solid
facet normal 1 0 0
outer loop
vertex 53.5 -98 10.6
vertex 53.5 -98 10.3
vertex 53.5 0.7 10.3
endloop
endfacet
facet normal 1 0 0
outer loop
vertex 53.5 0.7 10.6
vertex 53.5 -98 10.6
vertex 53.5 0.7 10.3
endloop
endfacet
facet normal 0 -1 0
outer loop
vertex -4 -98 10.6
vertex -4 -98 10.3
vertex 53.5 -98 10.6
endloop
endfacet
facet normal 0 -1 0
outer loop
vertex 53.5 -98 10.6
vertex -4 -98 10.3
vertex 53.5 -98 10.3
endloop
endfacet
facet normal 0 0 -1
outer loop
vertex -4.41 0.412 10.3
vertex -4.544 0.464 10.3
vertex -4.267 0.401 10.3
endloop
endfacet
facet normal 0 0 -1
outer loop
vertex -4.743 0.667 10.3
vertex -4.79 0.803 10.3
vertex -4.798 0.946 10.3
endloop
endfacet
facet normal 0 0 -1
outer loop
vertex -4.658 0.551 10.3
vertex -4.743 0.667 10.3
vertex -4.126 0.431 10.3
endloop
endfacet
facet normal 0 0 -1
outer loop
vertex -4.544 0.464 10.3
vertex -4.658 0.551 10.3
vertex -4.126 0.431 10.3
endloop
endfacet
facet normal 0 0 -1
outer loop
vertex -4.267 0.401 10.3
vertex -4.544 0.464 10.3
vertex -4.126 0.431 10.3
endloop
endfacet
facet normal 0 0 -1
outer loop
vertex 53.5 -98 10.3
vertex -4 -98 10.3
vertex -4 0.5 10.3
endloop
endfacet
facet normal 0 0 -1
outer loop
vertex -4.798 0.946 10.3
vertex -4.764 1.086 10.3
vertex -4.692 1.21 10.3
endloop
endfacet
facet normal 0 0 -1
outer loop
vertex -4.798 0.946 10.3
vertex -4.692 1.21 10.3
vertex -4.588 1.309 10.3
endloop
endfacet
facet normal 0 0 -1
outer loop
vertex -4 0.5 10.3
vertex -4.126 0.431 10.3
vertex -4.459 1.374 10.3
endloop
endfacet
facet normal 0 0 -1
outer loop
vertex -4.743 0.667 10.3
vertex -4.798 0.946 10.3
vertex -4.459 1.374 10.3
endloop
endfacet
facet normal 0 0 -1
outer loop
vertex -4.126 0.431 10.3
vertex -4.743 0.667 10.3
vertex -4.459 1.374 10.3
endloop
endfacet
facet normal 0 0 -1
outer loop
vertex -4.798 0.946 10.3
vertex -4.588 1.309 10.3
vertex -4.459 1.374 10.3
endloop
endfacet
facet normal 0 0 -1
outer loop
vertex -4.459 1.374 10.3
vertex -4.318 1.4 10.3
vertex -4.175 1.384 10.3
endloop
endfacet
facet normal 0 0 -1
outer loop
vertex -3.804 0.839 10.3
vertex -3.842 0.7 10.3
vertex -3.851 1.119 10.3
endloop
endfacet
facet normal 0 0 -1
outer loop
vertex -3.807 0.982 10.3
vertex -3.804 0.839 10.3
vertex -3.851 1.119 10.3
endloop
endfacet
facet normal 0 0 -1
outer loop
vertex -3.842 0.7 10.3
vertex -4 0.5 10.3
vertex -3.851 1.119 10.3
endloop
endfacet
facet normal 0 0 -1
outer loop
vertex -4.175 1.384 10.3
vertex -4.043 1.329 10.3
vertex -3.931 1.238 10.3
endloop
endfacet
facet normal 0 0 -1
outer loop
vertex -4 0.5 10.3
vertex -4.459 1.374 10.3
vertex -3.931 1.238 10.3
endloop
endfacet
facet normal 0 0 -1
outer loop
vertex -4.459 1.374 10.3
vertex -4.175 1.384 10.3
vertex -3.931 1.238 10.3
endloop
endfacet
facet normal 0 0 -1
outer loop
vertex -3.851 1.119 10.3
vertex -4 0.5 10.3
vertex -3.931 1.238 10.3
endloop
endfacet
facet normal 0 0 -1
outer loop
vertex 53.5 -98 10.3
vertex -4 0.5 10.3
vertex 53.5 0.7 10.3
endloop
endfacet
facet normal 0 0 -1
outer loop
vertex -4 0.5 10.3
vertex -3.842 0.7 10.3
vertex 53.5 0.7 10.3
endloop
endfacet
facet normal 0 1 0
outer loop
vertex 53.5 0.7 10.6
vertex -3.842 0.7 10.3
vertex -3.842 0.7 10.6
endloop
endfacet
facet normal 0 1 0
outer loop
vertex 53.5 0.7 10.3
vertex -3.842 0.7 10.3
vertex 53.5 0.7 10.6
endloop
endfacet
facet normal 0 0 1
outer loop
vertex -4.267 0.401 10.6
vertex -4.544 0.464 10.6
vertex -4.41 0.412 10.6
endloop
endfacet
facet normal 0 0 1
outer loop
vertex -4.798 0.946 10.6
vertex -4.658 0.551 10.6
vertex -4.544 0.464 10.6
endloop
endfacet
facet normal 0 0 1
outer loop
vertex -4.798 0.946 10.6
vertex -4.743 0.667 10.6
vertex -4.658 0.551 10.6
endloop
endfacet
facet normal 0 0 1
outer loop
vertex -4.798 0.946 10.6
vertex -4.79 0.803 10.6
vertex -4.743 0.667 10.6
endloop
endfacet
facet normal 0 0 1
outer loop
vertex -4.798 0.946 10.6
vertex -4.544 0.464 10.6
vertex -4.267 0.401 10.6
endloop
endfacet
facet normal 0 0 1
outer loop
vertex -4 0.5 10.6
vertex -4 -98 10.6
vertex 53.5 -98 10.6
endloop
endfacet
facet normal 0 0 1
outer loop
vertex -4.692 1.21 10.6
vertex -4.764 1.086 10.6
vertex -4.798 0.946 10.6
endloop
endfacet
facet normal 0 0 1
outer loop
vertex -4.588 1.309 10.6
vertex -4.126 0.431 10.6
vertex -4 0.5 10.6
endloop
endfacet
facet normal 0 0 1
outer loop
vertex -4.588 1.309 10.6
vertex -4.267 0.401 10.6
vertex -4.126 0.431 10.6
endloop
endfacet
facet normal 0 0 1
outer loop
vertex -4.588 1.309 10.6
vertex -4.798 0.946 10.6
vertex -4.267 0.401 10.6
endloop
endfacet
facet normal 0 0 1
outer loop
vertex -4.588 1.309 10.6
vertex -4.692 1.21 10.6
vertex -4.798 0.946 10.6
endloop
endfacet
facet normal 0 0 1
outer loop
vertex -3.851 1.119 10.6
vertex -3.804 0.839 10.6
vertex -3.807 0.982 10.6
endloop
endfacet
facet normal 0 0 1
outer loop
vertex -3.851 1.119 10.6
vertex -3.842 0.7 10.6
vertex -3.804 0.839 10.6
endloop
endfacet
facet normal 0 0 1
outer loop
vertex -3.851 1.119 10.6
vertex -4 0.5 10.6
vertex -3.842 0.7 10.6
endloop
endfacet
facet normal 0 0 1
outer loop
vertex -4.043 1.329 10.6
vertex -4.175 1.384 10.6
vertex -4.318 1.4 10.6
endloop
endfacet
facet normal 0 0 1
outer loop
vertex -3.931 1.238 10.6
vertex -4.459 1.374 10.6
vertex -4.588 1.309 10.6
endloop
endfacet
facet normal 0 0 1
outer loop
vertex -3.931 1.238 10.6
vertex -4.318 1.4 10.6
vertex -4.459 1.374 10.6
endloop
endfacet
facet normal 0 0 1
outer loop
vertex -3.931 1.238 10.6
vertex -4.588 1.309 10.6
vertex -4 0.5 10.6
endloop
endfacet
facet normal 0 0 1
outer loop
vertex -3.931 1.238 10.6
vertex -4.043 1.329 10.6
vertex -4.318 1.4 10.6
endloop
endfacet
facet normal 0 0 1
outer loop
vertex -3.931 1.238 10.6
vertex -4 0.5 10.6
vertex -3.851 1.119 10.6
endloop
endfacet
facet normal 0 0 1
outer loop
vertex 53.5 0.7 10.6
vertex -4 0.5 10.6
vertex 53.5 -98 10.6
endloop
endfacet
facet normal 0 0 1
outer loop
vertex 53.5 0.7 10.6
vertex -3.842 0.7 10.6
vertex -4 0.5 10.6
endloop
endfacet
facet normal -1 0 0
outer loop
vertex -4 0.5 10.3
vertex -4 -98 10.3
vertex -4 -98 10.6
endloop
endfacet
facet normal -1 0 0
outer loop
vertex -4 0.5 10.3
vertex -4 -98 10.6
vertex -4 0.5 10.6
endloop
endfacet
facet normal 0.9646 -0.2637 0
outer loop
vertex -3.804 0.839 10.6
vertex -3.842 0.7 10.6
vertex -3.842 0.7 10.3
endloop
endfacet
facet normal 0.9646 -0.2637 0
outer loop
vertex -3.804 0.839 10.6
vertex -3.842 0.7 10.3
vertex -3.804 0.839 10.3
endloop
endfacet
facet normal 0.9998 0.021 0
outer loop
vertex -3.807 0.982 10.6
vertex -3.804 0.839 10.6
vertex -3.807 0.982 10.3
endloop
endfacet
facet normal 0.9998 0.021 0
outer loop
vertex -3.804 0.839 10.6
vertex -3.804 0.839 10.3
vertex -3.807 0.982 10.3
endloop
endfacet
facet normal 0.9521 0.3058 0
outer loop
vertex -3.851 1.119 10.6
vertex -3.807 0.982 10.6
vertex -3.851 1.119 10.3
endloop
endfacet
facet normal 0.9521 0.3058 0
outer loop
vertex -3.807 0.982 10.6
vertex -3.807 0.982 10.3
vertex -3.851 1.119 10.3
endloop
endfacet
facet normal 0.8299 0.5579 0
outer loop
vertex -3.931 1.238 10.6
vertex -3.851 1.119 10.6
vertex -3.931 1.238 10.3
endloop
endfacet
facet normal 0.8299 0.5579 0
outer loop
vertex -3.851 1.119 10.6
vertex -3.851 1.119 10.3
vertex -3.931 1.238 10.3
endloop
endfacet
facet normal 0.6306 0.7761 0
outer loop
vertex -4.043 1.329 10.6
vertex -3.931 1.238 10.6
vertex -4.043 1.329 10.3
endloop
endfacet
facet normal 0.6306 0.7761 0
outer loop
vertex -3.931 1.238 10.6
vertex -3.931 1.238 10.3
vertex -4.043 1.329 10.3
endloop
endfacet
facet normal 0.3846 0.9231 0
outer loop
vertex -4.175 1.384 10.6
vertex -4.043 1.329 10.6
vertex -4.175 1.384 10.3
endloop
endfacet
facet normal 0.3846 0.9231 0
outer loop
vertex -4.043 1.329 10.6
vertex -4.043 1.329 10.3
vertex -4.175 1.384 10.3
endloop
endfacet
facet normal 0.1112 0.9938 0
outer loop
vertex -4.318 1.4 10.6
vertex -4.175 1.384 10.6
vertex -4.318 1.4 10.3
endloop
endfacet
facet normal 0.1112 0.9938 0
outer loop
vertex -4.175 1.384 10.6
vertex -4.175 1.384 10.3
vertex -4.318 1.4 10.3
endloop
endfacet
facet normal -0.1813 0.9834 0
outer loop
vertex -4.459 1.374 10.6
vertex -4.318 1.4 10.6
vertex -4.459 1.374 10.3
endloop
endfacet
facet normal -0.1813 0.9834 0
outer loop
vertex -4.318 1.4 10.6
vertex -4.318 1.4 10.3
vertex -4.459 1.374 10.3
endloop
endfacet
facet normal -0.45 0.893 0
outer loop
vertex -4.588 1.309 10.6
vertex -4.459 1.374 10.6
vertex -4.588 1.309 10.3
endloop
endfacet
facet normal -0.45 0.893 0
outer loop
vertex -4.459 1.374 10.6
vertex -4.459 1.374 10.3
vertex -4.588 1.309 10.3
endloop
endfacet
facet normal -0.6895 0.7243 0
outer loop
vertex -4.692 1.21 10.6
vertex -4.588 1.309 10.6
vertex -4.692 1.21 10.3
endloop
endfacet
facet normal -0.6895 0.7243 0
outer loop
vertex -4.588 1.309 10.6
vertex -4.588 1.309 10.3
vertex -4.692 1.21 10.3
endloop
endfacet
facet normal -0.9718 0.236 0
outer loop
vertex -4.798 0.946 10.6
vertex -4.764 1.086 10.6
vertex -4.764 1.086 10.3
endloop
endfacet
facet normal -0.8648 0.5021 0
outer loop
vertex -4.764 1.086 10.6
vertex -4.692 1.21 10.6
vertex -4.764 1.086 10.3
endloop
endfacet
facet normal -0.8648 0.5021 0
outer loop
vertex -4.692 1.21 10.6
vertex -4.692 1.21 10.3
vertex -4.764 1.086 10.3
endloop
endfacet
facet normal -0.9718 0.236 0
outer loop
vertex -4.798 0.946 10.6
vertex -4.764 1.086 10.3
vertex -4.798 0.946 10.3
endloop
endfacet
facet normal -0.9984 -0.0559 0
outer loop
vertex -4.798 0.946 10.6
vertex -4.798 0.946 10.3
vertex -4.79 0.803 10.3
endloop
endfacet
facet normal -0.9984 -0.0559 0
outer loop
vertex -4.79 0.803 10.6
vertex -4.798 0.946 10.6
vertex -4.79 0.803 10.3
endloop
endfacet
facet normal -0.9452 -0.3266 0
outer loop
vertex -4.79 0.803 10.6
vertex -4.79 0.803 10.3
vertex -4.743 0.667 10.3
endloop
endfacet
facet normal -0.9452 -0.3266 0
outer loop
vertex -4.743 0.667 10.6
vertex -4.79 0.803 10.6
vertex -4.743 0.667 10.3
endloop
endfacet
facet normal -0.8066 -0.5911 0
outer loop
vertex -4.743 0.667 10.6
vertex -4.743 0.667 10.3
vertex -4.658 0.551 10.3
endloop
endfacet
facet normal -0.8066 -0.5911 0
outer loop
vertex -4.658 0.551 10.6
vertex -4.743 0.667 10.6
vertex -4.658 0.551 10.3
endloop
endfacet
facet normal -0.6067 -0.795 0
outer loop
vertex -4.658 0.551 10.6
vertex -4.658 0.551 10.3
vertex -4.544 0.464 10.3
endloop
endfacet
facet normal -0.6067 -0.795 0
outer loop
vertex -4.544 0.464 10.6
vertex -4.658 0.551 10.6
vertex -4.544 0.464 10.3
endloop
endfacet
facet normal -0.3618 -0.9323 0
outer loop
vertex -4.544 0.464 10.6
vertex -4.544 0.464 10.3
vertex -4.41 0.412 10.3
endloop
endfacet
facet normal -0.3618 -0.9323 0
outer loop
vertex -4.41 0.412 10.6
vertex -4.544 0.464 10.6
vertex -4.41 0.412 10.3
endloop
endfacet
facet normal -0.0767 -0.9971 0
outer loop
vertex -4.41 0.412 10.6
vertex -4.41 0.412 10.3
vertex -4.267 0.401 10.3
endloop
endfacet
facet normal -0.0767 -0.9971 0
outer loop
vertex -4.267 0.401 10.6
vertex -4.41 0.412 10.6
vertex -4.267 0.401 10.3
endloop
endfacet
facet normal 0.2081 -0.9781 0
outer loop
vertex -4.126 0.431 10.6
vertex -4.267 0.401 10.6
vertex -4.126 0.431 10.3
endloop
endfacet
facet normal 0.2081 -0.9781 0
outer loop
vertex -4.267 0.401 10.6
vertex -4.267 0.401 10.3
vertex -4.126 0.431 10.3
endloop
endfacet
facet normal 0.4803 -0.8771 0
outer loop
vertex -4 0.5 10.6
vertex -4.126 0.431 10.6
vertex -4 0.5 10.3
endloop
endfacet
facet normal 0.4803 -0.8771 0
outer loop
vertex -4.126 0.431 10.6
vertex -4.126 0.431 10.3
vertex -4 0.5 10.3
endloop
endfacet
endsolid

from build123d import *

# Parameters (mm, degrees)
CYLINDER_R     = 0.5
CYLINDER_DEPTH = 0.3
BOX004_W       = 57.5
BOX004_H       = 98.7
BOX004_DEPTH   = 0.3


with BuildPart() as cylinder:
    # Cylinder → Cylinder (new body)
    with BuildSketch(Plane(origin=(-4.3, 0.9, 10.3), x_dir=(1, 0, 0), z_dir=(0, 0, 1))):
        Circle(CYLINDER_R)
    extrude(amount=CYLINDER_DEPTH)


with BuildPart() as displayframe001:
    # Box004 → Box004 (new body)
    with BuildSketch(Plane(origin=(-4, -98, 10.3), x_dir=(1, 0, 0), z_dir=(0, 0, 1))):
        with Locations((28.75, 49.35)):
            Rectangle(BOX004_W, BOX004_H)
    extrude(amount=BOX004_DEPTH)

    # Fusion001: union Cylinder
    add(cylinder.part)


solid = displayframe001.part
